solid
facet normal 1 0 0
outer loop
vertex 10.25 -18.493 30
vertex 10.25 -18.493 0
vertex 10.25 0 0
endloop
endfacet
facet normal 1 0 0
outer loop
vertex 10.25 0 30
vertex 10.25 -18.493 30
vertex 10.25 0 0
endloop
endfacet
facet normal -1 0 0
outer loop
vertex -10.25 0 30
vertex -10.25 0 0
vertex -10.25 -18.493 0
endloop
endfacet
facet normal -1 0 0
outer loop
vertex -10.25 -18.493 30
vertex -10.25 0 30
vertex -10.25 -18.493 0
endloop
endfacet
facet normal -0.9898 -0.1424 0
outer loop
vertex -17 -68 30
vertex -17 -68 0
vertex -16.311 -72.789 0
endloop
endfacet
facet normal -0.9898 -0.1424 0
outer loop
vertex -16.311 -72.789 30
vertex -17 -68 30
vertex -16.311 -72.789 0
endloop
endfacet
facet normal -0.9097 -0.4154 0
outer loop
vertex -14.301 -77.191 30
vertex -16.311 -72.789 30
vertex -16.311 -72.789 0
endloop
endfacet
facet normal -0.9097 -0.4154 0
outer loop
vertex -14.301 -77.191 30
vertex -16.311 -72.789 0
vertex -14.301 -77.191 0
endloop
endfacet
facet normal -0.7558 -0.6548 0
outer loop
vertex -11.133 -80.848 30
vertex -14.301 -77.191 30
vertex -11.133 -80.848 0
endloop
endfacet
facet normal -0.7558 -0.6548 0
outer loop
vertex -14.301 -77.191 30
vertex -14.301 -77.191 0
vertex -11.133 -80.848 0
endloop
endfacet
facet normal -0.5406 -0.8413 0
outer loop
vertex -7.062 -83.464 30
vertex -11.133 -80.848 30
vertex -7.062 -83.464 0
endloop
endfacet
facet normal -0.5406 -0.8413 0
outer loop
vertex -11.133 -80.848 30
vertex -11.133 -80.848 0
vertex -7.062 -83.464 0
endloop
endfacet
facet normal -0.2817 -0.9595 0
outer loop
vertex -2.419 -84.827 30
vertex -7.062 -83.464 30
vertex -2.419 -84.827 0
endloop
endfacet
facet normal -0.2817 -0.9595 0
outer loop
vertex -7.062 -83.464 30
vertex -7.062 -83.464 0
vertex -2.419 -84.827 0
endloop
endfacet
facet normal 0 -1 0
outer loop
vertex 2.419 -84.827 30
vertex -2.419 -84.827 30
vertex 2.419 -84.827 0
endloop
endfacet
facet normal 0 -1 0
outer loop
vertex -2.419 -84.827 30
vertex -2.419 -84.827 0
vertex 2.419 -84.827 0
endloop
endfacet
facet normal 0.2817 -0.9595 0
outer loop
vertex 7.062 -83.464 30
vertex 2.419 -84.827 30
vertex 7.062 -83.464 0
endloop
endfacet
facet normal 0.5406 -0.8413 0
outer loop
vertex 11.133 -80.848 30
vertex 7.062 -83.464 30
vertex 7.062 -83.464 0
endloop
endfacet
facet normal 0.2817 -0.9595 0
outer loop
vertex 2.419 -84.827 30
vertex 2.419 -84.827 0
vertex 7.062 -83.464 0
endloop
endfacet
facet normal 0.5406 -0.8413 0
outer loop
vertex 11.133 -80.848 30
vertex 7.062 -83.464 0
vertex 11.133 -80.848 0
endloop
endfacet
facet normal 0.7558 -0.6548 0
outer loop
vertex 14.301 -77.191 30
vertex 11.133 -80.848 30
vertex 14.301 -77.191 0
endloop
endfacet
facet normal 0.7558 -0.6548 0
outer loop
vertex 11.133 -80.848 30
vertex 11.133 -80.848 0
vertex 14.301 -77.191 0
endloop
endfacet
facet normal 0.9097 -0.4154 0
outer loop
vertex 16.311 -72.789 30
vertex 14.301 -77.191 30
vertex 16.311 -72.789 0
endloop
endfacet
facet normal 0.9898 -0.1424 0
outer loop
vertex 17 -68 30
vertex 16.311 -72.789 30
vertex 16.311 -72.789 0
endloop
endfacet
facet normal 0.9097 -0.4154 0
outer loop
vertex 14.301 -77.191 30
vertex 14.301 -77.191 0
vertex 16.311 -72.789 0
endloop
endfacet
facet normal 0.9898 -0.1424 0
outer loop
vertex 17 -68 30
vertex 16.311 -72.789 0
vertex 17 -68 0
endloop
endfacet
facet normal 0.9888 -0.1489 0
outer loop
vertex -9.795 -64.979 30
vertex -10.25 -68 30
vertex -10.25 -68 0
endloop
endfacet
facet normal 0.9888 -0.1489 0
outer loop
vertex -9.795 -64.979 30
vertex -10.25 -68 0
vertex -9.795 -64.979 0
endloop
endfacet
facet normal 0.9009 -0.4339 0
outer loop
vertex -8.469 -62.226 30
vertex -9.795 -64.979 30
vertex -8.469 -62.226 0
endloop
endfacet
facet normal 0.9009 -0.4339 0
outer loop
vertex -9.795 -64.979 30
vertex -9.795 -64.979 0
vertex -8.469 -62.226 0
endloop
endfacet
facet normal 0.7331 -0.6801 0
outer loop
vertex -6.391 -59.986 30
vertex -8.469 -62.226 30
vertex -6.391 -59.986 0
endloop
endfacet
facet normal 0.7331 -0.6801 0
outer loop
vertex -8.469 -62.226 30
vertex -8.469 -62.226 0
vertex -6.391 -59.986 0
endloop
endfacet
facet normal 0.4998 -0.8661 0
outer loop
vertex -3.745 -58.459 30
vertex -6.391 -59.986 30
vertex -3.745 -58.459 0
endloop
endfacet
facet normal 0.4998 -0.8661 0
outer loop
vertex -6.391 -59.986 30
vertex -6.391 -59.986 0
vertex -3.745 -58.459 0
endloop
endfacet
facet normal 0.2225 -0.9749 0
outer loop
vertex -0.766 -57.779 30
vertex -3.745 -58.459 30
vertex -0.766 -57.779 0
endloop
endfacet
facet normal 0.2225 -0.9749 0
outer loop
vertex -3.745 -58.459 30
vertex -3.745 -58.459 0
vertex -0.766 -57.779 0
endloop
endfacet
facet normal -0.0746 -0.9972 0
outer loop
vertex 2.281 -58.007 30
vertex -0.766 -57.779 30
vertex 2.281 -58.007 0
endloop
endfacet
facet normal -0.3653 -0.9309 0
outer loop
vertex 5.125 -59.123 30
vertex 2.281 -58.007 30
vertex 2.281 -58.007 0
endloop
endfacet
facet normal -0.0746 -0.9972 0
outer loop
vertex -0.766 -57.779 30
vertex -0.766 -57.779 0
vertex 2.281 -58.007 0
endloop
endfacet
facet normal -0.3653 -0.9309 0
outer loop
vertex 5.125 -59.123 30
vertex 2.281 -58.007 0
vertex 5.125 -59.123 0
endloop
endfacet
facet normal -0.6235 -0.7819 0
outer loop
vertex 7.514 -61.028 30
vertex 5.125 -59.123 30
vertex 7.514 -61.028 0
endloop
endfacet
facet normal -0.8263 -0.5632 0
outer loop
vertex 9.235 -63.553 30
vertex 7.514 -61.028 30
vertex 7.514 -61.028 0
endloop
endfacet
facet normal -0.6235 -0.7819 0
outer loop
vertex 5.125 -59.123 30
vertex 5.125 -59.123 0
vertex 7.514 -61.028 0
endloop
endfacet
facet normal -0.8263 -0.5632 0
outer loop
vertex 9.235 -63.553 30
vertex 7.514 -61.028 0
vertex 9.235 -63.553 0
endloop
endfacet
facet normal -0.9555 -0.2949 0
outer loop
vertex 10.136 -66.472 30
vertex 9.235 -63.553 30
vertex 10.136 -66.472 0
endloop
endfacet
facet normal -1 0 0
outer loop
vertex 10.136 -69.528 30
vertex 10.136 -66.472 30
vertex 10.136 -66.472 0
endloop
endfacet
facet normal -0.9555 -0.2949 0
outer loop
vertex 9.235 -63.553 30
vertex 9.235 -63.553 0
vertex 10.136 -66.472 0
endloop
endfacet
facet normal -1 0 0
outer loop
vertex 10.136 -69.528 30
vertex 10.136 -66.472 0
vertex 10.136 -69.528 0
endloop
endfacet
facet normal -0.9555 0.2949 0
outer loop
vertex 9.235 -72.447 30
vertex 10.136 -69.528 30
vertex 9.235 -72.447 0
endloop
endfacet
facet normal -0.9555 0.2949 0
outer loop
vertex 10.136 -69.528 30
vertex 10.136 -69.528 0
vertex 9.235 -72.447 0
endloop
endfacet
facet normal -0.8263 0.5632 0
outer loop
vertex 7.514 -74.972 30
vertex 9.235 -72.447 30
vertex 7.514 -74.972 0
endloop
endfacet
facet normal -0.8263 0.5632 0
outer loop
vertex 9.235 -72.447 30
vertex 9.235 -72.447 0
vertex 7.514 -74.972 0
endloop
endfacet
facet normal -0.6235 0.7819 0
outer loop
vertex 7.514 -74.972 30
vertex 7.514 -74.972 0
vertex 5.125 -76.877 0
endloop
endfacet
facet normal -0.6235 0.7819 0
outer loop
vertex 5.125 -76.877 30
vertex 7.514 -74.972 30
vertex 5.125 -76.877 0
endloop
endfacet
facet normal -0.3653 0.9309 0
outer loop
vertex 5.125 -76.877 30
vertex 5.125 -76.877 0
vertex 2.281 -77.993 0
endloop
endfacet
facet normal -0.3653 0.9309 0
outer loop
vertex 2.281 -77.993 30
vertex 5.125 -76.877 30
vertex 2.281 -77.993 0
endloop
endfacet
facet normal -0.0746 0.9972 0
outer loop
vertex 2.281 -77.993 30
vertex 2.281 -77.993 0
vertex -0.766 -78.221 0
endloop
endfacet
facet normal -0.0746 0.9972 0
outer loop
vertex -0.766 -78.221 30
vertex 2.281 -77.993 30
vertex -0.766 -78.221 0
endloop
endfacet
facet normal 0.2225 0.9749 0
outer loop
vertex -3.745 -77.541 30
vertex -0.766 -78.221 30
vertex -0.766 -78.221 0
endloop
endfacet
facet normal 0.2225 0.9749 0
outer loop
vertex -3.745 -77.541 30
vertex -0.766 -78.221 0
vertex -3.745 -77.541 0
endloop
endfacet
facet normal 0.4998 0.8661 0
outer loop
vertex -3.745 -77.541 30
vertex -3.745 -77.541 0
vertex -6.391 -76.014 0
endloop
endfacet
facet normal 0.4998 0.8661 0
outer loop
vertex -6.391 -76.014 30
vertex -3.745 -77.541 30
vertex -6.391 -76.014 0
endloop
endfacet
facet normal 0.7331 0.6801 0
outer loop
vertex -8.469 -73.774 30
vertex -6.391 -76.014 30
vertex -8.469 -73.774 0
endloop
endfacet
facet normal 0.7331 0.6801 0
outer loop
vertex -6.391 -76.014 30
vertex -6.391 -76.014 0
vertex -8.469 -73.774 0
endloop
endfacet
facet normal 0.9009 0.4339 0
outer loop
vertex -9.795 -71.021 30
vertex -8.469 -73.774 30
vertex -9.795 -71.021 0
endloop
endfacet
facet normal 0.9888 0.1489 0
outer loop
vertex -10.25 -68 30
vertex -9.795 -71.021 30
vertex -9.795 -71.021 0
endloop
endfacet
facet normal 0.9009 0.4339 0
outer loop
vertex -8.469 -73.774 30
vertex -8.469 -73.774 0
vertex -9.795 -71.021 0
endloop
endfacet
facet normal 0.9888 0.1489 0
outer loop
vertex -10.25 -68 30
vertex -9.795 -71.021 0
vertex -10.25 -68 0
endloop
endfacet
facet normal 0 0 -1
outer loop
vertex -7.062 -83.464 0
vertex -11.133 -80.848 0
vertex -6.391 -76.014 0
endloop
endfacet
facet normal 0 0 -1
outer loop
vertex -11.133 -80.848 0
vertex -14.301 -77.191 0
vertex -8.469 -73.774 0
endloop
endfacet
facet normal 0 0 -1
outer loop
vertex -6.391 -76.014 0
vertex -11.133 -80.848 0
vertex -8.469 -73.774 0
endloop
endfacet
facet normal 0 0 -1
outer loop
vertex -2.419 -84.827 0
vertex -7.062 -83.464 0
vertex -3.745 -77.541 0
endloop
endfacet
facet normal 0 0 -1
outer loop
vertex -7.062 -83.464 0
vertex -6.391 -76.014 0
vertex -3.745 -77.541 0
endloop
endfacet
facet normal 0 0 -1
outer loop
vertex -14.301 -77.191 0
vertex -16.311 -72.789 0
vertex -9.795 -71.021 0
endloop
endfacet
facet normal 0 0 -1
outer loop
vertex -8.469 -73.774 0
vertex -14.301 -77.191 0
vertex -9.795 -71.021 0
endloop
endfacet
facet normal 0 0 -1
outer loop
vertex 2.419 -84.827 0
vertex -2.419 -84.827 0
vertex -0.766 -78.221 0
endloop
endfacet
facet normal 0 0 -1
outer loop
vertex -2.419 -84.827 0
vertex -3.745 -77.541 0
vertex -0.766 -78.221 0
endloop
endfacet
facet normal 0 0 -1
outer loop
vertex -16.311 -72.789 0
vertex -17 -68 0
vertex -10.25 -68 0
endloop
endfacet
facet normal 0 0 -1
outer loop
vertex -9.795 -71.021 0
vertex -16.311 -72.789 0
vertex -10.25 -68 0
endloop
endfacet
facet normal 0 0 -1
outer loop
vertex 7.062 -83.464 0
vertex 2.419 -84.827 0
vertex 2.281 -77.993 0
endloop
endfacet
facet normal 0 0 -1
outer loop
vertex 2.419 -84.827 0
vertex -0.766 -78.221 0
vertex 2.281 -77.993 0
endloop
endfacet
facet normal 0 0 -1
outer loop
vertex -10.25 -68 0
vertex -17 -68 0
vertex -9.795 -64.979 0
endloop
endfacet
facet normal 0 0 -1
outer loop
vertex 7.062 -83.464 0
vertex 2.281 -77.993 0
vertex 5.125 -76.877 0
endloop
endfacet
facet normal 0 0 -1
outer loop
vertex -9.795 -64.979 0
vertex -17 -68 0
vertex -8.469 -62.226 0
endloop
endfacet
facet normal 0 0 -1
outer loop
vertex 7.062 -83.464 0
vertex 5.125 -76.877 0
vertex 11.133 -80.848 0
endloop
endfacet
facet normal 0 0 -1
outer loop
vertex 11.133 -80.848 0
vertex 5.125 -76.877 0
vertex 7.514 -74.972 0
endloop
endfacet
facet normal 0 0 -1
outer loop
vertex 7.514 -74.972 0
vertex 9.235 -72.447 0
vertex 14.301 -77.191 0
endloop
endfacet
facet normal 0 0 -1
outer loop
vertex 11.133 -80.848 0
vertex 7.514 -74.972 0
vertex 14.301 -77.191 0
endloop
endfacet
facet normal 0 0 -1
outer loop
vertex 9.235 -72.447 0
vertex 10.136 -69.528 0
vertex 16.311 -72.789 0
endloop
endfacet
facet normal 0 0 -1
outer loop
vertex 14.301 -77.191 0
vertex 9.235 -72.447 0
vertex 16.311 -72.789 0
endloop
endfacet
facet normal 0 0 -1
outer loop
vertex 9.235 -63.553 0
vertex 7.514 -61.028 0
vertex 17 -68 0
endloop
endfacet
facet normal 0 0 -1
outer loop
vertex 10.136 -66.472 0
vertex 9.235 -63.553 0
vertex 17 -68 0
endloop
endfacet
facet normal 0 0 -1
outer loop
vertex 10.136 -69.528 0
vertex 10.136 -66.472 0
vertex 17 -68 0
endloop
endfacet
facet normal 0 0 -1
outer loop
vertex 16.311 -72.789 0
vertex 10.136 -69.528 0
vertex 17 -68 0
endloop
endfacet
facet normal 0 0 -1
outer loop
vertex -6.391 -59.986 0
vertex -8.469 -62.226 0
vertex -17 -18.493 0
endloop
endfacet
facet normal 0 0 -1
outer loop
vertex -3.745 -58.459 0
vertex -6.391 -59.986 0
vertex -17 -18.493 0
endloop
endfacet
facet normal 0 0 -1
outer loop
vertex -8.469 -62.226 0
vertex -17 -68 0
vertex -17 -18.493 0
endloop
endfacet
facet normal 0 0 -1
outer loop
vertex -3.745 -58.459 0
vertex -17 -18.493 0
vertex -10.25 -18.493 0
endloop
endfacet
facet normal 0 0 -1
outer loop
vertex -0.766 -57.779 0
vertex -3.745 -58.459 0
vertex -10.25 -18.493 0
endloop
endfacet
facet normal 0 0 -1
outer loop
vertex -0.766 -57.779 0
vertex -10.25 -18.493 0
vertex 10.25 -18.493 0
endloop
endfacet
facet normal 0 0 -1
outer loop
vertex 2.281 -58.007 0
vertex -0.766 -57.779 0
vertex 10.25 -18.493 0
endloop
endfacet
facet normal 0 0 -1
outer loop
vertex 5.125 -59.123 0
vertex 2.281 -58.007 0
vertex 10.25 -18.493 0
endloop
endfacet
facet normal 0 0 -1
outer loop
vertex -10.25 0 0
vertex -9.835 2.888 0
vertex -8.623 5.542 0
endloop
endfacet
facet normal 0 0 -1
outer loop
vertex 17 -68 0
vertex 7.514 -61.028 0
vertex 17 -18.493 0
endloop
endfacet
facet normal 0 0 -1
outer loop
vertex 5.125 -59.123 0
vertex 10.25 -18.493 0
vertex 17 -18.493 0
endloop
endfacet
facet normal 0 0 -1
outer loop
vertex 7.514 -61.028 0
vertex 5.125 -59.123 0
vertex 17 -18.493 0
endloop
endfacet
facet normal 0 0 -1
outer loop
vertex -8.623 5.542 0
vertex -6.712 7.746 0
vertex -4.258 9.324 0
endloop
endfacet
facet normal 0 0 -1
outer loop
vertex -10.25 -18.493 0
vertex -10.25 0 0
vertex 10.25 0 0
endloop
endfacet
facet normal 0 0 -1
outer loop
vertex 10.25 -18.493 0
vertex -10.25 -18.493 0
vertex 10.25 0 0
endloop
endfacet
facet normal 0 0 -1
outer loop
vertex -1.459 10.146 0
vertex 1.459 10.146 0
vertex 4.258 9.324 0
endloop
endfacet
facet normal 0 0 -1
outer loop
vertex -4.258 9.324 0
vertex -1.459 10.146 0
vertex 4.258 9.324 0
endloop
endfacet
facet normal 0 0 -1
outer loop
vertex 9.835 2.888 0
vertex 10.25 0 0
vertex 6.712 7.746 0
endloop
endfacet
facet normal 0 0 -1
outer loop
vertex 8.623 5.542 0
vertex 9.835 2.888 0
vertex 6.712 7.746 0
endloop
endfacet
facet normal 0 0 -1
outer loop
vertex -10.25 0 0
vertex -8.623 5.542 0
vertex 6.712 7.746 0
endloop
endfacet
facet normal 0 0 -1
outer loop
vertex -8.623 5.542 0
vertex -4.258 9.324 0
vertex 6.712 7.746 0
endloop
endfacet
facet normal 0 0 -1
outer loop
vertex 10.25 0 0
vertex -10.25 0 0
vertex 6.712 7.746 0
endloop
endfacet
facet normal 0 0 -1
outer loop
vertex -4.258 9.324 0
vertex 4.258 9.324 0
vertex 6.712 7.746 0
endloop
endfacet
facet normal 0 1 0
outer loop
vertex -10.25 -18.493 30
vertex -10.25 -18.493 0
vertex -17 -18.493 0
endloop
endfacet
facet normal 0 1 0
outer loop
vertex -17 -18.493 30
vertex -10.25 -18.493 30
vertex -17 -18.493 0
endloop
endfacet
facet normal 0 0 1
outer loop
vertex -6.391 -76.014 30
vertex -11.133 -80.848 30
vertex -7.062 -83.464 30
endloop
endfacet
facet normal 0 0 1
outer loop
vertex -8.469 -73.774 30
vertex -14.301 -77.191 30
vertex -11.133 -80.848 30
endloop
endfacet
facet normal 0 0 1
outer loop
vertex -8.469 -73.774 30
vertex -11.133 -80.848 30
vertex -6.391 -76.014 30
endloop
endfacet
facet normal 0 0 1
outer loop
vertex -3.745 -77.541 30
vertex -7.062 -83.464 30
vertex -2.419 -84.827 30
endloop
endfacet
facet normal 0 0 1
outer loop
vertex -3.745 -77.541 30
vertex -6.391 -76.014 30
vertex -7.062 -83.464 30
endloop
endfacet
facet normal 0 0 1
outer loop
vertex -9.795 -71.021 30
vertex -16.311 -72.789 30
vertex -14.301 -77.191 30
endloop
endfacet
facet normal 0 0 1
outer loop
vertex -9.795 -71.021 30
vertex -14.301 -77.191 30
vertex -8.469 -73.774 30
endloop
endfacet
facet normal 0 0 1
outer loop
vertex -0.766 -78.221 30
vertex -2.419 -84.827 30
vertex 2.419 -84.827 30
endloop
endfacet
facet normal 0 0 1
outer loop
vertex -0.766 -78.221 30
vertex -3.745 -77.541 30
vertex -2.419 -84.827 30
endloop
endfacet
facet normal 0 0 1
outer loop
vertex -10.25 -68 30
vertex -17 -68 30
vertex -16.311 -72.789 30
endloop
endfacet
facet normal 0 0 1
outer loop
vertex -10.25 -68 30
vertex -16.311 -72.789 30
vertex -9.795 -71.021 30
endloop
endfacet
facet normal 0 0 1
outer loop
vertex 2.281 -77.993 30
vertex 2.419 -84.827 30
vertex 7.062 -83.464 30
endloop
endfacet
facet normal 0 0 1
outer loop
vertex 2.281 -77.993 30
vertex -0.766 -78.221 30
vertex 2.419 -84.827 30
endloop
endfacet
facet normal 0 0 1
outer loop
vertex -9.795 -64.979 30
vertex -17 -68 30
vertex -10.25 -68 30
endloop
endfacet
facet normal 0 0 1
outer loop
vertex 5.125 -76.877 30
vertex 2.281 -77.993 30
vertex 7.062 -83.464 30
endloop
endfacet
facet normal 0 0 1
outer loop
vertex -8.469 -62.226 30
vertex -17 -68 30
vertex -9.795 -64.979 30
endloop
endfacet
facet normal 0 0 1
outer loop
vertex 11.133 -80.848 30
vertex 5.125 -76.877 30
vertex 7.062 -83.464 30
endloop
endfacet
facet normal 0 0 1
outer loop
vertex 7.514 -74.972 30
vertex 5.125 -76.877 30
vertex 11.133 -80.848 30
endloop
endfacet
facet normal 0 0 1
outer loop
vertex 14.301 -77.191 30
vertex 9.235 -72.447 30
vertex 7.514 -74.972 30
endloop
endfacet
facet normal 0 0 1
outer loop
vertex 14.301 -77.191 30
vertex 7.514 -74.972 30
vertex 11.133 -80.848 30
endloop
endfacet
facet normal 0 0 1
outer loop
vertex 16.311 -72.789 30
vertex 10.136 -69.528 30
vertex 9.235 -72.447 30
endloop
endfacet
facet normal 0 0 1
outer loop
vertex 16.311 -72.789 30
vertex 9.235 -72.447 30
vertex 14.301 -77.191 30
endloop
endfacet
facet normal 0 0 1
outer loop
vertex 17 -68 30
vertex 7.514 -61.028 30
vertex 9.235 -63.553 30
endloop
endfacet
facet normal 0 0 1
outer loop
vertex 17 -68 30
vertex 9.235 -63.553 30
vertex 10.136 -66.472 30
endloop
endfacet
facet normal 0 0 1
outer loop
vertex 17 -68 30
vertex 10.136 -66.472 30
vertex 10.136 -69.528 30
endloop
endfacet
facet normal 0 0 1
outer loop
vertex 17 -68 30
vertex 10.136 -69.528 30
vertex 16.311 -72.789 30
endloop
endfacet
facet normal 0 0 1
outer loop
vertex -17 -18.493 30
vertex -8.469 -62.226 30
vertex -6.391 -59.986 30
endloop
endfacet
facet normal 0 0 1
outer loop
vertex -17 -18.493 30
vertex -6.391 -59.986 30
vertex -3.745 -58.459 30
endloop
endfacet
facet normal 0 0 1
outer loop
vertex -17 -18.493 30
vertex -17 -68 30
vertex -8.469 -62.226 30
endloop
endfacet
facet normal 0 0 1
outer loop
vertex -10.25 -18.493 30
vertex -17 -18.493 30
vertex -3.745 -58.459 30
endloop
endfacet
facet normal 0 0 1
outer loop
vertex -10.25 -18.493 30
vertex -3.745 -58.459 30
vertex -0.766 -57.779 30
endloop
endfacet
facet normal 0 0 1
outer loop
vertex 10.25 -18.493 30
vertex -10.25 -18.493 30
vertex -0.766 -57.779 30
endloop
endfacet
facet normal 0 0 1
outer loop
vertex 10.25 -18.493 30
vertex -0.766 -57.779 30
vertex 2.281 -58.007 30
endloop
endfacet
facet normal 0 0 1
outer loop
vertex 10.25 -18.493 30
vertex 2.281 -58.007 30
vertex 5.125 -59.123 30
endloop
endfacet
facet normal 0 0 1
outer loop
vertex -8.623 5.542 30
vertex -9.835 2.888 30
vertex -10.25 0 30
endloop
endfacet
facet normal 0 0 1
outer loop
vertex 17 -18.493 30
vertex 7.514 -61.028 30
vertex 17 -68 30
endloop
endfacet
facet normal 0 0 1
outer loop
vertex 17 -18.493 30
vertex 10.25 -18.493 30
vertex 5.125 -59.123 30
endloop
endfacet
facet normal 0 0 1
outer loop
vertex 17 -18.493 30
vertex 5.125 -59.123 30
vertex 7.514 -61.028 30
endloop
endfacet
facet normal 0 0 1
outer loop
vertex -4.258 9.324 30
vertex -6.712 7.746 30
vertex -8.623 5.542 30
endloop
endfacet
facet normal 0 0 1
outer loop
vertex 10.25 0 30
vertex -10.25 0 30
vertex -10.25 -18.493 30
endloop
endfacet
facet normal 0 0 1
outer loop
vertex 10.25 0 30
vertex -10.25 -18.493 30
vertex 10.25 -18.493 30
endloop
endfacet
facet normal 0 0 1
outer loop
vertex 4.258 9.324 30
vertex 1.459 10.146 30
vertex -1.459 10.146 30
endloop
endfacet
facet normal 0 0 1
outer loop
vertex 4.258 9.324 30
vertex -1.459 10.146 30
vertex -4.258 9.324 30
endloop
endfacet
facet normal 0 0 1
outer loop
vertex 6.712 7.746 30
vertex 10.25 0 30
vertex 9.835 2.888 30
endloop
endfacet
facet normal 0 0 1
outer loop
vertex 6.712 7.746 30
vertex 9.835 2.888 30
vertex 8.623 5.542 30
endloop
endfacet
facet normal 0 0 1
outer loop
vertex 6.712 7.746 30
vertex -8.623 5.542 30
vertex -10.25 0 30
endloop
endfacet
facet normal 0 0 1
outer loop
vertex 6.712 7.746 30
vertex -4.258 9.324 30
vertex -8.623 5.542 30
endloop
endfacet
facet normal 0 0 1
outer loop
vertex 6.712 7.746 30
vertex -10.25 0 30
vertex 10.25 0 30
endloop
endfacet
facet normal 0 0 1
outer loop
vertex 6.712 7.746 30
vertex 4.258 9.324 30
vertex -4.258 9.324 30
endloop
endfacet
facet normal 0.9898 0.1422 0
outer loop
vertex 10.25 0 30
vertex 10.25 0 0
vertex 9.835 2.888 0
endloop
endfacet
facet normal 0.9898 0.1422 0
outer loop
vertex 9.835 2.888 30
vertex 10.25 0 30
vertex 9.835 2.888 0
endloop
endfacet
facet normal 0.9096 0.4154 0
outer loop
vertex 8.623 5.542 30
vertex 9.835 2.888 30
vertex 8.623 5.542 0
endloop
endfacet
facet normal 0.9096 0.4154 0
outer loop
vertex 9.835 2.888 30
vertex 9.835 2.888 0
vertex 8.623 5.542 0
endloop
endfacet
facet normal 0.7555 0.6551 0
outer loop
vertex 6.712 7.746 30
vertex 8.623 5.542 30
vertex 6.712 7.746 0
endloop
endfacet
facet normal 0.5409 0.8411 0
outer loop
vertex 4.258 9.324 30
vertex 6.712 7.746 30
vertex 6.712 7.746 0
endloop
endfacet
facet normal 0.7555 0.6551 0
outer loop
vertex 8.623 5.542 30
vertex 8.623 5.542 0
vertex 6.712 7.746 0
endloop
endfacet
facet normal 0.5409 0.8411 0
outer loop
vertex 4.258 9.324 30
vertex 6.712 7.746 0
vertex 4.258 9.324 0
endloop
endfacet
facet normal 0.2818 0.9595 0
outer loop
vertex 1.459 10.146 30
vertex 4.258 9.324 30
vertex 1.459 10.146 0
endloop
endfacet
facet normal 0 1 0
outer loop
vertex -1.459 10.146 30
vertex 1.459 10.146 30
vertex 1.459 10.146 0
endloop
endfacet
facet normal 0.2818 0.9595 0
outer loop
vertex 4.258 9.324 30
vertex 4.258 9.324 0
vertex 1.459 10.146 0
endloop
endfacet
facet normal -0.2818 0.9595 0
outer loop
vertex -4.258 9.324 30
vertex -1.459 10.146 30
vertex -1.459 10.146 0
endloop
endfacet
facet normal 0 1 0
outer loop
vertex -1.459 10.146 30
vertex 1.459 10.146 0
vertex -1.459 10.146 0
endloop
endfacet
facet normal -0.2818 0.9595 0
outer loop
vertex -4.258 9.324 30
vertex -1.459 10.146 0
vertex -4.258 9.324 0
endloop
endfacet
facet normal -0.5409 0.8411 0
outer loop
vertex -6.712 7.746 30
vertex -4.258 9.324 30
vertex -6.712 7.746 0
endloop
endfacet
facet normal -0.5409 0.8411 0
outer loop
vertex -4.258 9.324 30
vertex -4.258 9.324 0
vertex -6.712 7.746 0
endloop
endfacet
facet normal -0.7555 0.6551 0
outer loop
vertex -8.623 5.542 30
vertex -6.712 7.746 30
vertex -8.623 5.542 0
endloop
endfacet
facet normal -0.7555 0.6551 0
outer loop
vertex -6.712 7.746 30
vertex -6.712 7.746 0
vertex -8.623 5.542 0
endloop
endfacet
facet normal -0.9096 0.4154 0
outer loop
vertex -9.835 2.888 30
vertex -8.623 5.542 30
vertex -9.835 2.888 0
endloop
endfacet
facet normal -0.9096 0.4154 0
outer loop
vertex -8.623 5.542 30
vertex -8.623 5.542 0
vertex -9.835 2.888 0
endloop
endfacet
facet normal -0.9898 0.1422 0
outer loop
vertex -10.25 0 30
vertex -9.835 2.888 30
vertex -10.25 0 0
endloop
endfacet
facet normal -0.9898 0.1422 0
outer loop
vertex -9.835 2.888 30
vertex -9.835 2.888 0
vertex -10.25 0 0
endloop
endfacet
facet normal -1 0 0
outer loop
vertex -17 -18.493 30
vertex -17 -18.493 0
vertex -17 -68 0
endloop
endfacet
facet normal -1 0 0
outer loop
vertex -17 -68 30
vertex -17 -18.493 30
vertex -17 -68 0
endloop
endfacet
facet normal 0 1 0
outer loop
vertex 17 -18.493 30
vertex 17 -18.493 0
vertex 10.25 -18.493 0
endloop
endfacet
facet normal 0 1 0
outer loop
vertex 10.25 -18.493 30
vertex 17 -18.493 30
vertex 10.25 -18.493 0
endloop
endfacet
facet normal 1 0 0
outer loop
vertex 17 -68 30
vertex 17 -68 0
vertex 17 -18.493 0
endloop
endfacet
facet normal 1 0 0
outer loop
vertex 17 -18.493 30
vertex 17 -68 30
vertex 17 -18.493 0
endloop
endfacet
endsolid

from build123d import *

# Parameters (mm, degrees)
SKETCH1_W           = 20.5
SKETCH1_H           = 5
BOSS_EXTRUDE1_DEPTH = 30


with BuildPart() as part:
    # Sketch1 → Boss-Extrude1 (new body)
    with BuildSketch(Plane.XY):
        with BuildLine():
            Line((17, -18.493179267), (10.25, -18.493179267))
            Line((10.25, -18.493179267), (10.25, -68))
            ThreePointArc((10.25, -68), (0, -78.25), (-10.25, -68))
            Line((-10.25, -68), (-10.25, -18.493179267))
            Line((-10.25, -18.493179267), (-17, -18.493179267))
            Line((-17, -18.493179267), (-17, -68))
            ThreePointArc((-17, -68), (0, -85), (17, -68))
            Line((17, -68), (17, -18.493179267))
        make_face()
        with BuildLine():
            Line((10.25, -68), (10.25, -18.493179267))
            Line((10.25, -18.493179267), (-10.25, -18.493179267))
            Line((-10.25, -18.493179267), (-10.25, -68))
            ThreePointArc((-10.25, -68), (0, -57.75), (10.25, -68))
        make_face()
        with Locations((0, -15.993179267)):
            Rectangle(SKETCH1_W, SKETCH1_H)
        with BuildLine():
            Line((10.25, -13.493179267), (10.25, 0))
            ThreePointArc((10.25, 0), (0, -10.25), (-10.25, 0))
            Line((-10.25, 0), (-10.25, -13.493179267))
            Line((-10.25, -13.493179267), (10.25, -13.493179267))
        make_face()
        with BuildLine():
            ThreePointArc((-10.25, 0), (0, -10.25), (10.25, 0))
            Line((10.25, 0), (-10.25, 0))
        make_face()
        with BuildLine():
            Line((-10.25, 0), (10.25, 0))
            ThreePointArc((10.25, 0), (0, 10.25), (-10.25, 0))
        make_face()
    extrude(amount=BOSS_EXTRUDE1_DEPTH)


solid = part.part
